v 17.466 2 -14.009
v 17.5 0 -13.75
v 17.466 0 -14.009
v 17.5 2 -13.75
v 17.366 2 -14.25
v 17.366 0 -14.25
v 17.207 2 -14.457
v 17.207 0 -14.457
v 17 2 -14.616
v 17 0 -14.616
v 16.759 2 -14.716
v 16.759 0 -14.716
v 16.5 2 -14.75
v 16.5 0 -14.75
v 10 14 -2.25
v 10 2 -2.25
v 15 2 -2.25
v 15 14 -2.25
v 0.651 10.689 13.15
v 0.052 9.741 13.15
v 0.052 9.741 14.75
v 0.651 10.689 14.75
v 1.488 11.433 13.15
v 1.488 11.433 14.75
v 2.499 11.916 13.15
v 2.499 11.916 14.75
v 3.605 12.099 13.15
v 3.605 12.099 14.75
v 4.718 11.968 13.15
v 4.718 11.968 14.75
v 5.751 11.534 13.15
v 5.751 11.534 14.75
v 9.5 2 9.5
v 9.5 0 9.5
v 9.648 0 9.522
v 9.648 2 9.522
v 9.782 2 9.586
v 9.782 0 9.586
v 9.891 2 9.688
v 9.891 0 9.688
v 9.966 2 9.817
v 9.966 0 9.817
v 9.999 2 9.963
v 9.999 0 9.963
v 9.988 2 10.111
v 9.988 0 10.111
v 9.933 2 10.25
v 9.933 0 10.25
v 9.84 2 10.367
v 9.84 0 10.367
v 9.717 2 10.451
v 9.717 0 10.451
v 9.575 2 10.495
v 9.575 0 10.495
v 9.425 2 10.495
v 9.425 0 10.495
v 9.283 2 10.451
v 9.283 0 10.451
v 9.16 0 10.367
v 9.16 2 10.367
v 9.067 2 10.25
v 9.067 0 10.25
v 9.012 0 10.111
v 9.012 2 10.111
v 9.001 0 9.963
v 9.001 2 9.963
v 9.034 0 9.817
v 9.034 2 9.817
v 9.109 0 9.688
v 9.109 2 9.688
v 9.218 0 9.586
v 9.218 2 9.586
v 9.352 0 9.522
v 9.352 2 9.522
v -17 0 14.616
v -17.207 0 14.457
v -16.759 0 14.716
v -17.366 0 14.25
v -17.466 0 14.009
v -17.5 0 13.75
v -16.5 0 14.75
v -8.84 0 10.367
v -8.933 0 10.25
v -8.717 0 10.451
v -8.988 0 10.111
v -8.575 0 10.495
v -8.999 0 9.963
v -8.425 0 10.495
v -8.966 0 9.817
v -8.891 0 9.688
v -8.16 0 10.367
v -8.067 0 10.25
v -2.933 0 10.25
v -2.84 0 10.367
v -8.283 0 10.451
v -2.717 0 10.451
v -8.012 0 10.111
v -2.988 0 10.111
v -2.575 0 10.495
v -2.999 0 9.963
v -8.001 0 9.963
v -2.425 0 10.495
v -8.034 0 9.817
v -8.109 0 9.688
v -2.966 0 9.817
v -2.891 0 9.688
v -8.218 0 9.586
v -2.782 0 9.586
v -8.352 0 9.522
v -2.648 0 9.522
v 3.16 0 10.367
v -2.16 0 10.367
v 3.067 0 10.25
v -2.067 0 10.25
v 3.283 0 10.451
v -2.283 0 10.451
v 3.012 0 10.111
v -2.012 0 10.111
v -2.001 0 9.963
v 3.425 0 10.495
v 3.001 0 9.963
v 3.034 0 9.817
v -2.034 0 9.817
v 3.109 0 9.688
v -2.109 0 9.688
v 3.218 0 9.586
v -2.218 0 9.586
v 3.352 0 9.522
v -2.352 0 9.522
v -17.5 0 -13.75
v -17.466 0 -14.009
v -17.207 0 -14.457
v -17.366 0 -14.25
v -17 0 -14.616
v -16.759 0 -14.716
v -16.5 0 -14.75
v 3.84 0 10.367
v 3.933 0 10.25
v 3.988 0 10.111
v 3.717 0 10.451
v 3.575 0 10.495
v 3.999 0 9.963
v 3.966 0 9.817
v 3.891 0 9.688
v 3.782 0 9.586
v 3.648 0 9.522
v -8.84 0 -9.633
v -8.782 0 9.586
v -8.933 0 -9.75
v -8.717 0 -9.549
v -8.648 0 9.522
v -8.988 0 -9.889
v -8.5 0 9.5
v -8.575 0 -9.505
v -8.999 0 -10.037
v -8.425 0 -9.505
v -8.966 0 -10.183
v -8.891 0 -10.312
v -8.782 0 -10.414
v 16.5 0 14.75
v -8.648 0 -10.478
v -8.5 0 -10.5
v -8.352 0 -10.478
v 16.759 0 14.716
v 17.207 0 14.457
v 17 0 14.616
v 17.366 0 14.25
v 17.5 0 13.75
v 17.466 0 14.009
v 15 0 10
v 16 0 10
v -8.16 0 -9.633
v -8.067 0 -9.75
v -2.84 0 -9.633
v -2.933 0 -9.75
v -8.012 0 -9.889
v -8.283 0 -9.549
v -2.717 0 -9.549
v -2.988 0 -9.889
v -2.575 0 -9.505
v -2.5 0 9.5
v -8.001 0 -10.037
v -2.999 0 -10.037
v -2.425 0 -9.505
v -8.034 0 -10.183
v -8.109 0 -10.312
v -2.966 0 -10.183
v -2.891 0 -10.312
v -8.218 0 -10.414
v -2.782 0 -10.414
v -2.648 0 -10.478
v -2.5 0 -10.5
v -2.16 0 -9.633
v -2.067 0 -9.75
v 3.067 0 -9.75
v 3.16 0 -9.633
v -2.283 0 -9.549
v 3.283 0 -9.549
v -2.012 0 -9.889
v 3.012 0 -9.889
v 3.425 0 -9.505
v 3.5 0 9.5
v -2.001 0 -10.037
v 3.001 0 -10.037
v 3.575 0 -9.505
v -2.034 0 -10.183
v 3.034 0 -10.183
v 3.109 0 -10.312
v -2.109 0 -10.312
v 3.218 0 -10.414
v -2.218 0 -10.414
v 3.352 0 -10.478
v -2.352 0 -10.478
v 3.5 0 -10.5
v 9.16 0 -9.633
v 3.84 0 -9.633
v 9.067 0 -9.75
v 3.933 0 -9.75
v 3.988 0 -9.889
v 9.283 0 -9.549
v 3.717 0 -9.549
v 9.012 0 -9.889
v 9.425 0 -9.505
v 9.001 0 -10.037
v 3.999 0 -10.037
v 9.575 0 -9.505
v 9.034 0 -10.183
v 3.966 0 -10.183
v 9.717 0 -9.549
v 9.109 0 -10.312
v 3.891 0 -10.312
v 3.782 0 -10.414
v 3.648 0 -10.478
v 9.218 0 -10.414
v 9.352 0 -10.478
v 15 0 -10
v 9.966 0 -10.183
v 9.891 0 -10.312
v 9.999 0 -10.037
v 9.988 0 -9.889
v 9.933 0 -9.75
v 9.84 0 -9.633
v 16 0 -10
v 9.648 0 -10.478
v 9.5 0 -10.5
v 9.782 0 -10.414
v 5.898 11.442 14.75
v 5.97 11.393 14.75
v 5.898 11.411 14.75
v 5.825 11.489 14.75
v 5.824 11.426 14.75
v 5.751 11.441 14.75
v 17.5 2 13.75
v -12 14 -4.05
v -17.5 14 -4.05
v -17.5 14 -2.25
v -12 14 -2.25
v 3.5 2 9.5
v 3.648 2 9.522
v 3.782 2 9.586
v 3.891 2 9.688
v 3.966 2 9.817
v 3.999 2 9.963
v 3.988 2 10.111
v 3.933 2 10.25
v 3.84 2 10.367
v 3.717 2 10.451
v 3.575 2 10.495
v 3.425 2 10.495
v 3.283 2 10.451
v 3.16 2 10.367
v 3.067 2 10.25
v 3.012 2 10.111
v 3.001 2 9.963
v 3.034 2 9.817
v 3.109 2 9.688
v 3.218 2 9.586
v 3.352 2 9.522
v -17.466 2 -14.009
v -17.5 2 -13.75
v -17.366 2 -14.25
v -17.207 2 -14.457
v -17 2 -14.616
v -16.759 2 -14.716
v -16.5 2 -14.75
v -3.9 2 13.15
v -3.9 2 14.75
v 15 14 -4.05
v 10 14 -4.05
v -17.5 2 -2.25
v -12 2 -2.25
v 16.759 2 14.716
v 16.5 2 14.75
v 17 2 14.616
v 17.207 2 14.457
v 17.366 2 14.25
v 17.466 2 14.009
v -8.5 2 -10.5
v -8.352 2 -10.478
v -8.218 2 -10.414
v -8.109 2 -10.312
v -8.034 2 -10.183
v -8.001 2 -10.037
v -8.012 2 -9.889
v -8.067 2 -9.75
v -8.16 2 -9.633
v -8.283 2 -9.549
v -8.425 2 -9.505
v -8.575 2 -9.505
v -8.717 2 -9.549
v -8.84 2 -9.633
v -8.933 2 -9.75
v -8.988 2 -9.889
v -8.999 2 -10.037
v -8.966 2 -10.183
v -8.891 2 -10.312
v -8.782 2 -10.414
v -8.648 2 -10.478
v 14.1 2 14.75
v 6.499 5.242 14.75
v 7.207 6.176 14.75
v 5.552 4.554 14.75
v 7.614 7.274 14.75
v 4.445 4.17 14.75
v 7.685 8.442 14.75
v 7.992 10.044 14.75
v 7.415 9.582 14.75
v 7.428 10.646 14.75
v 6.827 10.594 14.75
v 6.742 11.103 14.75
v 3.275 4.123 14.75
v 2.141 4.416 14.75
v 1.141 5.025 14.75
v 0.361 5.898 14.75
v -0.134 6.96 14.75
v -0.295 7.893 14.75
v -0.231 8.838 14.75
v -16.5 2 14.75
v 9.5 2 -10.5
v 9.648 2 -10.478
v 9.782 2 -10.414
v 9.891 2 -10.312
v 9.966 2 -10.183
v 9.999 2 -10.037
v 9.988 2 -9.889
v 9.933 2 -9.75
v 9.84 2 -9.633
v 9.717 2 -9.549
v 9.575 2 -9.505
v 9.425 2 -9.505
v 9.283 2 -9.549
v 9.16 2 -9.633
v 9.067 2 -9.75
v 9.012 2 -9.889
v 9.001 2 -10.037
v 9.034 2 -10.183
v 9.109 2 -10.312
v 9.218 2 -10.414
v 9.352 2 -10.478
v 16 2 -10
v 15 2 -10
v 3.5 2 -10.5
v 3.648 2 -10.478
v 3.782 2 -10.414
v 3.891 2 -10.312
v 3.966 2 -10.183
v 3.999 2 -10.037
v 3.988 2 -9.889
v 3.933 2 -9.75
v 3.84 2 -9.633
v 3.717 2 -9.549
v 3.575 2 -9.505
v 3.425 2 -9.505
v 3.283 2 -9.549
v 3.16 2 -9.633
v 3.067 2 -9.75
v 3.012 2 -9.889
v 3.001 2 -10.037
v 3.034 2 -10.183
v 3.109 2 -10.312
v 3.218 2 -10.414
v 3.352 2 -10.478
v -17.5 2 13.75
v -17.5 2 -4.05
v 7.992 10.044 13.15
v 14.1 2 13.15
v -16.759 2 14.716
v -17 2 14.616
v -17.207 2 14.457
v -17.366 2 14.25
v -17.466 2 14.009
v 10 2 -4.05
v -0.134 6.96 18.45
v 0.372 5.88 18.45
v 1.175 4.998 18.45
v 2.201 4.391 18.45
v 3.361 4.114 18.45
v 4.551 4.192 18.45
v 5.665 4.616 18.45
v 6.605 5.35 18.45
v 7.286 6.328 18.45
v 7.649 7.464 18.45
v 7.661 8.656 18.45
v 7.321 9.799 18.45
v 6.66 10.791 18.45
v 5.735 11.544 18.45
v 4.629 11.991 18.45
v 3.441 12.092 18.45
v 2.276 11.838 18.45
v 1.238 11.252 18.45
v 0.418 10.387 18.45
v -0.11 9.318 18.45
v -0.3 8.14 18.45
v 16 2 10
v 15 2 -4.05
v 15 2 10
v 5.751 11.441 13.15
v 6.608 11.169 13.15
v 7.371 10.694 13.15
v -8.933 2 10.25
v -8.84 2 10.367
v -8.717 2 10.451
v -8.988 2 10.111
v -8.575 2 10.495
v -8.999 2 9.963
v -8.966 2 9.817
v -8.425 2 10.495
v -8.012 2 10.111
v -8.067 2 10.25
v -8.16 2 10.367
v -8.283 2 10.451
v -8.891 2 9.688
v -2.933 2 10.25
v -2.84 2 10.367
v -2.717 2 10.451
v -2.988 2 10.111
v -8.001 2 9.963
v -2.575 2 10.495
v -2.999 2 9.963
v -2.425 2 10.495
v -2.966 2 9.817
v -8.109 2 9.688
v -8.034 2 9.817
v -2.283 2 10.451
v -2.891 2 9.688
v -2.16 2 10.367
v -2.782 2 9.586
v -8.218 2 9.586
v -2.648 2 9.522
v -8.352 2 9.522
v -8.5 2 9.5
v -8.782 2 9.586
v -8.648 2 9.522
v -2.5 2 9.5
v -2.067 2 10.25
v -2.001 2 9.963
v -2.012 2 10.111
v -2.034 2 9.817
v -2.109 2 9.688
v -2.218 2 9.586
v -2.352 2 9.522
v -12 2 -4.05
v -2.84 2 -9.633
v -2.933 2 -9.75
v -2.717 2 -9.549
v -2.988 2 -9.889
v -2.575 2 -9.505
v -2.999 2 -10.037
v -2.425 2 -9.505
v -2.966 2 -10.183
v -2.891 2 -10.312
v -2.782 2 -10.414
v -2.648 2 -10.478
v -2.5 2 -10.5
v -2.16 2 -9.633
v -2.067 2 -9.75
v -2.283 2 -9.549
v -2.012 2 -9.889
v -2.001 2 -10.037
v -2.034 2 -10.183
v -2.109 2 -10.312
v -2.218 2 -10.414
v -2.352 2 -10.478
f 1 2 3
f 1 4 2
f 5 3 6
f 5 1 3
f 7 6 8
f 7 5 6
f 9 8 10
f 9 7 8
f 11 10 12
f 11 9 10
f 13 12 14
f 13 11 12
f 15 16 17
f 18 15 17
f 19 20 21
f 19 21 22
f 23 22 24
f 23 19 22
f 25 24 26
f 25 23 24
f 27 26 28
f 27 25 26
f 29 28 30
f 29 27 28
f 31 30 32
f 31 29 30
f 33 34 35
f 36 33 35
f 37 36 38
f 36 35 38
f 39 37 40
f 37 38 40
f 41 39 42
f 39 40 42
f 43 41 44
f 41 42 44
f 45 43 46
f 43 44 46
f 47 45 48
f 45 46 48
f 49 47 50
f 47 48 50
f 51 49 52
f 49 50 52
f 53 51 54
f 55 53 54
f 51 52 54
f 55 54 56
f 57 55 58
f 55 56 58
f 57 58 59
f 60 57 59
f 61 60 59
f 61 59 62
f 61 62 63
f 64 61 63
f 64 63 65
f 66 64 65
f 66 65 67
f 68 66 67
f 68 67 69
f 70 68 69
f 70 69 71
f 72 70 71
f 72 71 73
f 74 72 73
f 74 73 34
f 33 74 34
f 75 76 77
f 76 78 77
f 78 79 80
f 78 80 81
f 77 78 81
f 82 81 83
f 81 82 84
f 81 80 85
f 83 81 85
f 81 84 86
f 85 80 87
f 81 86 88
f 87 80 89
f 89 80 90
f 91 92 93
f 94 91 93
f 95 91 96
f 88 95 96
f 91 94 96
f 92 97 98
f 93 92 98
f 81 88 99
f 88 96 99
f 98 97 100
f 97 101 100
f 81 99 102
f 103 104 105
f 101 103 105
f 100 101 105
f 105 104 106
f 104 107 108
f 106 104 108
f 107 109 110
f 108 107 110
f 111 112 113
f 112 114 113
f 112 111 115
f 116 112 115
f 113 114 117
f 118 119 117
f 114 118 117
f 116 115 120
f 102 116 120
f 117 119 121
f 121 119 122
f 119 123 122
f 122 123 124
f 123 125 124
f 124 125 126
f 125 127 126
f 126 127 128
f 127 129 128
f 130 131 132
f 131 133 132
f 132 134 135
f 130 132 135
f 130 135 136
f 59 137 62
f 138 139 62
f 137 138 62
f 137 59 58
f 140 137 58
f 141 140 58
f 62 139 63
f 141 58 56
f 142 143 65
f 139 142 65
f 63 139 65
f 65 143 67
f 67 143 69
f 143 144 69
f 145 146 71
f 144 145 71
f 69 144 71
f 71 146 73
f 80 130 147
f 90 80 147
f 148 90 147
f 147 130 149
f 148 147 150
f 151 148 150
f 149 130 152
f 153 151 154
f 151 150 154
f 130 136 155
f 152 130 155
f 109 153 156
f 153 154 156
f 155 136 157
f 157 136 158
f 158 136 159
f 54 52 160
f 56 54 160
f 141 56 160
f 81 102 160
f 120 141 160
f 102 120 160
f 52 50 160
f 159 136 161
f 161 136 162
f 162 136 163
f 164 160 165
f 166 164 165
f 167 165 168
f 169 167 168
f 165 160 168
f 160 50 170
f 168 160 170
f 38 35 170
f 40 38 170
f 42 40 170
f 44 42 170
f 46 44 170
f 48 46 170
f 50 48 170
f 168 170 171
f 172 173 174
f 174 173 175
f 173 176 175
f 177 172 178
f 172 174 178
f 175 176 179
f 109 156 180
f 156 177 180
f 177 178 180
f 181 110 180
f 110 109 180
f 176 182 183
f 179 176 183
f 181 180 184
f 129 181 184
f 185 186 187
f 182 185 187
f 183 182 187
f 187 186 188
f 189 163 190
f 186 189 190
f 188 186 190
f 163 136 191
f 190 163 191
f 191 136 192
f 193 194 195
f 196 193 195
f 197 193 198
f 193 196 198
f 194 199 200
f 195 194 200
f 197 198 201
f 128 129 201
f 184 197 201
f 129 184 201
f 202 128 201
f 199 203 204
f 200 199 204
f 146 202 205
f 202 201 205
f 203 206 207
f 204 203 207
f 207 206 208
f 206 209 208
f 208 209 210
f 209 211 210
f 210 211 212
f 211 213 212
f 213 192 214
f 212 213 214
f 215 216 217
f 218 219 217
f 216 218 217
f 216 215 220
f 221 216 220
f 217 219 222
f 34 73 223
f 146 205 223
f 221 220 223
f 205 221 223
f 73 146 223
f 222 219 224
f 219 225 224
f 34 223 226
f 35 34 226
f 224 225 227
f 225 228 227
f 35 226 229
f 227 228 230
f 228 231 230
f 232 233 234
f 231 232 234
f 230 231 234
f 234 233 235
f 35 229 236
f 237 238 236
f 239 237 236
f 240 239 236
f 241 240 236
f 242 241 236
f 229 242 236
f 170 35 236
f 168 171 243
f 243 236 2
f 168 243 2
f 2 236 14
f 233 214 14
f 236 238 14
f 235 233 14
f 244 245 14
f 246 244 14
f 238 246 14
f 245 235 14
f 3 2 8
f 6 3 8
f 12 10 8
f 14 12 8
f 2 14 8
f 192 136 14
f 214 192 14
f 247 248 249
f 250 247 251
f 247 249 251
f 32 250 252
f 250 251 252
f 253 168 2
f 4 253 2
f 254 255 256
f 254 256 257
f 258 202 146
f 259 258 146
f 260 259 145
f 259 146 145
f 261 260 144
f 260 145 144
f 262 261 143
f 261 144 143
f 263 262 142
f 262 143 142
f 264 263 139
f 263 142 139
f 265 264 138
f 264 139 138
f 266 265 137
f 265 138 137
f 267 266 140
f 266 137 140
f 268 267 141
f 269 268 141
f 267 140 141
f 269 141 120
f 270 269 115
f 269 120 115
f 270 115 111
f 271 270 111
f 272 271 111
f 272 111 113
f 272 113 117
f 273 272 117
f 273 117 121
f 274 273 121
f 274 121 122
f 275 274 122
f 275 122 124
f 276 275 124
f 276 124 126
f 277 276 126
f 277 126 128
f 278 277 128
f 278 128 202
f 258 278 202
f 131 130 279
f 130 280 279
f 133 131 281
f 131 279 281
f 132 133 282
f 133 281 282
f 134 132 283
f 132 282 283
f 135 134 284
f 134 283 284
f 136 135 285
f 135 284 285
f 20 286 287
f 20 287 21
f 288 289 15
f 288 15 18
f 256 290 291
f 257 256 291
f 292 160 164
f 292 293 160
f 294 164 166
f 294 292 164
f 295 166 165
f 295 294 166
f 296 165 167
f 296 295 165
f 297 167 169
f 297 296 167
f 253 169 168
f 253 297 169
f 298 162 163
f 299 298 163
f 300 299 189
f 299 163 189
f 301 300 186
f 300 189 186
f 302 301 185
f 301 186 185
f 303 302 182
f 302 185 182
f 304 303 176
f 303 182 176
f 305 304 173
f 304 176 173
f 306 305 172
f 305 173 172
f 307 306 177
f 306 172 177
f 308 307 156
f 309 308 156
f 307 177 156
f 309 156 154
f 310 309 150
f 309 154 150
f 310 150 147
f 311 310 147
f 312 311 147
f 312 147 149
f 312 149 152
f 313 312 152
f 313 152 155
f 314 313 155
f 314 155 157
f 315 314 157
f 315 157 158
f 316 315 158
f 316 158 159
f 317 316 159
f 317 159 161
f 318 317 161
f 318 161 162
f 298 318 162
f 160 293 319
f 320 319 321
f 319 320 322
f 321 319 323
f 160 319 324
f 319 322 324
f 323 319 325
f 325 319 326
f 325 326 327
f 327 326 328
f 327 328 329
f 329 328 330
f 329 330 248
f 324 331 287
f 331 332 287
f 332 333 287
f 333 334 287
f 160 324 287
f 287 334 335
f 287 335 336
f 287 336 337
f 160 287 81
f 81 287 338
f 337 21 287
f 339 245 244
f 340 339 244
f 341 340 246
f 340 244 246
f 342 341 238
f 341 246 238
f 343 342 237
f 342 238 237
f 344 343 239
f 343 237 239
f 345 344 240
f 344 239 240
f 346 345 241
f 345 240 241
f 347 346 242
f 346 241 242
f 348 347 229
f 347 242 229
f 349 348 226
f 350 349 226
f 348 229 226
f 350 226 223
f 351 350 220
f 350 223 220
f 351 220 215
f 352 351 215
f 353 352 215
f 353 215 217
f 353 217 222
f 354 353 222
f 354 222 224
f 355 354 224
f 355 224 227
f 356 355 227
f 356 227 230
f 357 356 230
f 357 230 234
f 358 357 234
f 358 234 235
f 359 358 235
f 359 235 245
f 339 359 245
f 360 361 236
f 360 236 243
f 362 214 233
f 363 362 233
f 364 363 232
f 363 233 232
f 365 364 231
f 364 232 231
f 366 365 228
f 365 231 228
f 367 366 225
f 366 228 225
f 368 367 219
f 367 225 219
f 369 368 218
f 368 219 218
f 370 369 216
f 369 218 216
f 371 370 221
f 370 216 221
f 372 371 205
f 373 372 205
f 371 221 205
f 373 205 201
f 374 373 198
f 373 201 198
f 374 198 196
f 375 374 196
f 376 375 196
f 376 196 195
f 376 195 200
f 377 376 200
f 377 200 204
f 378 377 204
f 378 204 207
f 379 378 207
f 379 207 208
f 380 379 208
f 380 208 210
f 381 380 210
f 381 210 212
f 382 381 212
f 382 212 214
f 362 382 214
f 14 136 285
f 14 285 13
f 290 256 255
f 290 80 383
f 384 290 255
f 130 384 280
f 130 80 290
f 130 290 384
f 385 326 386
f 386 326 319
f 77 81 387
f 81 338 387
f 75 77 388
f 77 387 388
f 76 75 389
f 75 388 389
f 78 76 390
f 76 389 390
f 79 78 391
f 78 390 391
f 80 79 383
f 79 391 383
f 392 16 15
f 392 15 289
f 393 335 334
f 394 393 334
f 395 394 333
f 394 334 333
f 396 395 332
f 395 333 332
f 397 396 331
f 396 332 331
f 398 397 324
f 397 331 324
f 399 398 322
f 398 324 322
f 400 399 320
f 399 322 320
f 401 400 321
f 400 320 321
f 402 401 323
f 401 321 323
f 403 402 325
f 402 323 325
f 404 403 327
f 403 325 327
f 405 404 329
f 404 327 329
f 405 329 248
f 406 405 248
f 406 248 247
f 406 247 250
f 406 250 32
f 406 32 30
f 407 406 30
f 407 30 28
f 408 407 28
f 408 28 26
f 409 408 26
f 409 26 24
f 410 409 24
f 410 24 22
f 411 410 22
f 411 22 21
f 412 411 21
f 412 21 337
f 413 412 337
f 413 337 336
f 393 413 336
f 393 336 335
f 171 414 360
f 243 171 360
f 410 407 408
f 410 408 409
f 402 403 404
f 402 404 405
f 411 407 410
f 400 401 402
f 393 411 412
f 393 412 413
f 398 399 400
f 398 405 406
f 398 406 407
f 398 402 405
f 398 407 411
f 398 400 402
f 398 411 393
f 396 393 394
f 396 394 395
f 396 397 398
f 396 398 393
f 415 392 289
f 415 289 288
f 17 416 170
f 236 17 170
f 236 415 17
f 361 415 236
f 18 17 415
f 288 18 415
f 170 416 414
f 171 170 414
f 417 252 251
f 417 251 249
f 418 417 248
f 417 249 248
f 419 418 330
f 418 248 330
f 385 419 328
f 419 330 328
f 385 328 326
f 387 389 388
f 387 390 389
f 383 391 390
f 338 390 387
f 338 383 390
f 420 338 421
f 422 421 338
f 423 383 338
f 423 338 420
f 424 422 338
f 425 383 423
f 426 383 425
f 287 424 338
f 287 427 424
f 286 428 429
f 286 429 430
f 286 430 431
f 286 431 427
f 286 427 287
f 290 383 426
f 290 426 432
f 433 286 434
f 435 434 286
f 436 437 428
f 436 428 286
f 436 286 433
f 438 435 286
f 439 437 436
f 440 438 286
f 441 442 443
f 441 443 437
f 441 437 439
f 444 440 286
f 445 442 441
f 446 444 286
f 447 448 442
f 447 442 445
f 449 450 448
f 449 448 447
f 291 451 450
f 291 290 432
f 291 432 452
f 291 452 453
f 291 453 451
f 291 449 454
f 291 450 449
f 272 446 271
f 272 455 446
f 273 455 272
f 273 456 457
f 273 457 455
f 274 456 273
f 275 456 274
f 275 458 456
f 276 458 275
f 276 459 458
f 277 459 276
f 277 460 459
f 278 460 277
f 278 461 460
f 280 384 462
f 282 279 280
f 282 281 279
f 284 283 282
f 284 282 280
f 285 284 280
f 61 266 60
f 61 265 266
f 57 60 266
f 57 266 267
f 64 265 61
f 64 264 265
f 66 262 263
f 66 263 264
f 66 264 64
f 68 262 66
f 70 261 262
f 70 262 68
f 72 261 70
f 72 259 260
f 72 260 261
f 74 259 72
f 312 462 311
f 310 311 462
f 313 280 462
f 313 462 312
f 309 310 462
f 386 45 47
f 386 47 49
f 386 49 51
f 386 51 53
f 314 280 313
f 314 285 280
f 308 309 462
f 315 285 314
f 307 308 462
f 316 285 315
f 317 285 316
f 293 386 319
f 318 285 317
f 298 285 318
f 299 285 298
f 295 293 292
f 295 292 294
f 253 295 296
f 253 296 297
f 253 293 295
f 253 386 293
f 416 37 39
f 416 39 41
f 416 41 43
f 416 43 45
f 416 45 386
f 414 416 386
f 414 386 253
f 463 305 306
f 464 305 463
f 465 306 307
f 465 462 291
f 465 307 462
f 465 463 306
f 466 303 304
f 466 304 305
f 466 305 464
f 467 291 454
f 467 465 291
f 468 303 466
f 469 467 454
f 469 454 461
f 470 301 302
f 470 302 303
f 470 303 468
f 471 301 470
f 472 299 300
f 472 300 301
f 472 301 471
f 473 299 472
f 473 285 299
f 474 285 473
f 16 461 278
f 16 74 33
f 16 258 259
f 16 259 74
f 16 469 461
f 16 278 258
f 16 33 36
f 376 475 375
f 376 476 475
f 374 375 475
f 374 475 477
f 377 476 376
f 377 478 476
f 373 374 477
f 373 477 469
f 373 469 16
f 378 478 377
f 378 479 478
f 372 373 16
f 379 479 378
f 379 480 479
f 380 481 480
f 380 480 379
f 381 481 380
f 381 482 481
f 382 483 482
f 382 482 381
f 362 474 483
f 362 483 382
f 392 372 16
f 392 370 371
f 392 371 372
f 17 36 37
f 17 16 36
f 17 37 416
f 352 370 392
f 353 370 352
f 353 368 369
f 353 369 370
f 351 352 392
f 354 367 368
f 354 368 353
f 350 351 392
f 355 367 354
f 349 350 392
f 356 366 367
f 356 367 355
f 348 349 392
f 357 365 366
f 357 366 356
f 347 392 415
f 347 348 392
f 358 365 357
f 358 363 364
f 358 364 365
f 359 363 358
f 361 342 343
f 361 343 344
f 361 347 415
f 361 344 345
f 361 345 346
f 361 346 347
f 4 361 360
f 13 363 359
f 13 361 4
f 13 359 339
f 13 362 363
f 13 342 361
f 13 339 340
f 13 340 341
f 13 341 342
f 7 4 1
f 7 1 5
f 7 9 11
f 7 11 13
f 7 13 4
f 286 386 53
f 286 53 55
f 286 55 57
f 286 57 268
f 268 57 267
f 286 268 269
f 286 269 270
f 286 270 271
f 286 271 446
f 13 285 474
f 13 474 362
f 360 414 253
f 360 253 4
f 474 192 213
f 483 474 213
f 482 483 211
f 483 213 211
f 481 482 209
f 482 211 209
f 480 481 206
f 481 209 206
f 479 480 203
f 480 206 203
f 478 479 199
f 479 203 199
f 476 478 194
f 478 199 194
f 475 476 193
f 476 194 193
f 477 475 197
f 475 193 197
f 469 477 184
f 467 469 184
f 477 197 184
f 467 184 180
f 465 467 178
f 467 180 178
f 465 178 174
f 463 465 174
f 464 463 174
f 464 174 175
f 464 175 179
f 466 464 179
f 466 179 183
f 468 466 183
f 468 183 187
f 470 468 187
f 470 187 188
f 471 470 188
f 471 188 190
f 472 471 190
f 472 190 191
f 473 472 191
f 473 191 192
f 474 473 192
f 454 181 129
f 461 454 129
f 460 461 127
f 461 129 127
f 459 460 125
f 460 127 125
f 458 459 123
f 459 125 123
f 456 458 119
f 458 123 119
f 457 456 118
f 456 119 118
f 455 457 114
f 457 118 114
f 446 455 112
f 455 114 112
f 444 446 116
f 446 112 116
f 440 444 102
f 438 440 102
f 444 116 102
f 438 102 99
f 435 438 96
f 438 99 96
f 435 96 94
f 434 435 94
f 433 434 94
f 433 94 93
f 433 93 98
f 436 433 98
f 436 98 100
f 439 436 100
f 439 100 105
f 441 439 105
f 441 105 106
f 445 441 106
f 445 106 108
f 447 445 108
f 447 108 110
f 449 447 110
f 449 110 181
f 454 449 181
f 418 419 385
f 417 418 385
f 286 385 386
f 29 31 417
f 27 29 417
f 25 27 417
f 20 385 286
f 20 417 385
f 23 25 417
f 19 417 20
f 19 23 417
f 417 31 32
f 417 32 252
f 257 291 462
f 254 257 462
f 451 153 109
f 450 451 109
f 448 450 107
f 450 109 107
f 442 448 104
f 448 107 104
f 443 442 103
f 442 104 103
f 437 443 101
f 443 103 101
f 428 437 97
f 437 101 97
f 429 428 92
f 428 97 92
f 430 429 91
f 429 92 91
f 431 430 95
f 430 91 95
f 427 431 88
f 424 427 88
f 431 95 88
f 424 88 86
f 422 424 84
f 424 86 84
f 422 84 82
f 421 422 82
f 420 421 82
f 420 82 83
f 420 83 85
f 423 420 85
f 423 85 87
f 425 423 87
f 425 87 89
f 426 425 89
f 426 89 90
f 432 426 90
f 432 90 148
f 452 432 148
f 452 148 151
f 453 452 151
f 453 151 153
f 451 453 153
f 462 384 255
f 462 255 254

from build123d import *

# Parameters (mm, degrees)
CROQUIS1_W              = 35
CROQUIS1_H              = 29.5
SALIENTE_EXTRUIR1_DEPTH = 2
SALIENTE_EXTRUIR2_DEPTH = 1.6
CROQUIS3_R              = 4
SALIENTE_EXTRUIR3_DEPTH = 3.7
CROQUIS4_W              = 5.5
CROQUIS4_H              = 1.8
CROQUIS4_W_2            = 5
SALIENTE_EXTRUIR4_DEPTH = 12
CROQUIS5_W              = 1
CROQUIS5_H              = 20
CORTAR_EXTRUIR1_DEPTH   = 29.118543703
CROQUIS6_R              = 0.500490027
CORTAR_EXTRUIR2_DEPTH   = 12
REDONDEO1_R             = 1
SALIENTE_EXTRUIR5_START = 1.6
SALIENTE_EXTRUIR5_DEPTH = 1.6


with BuildPart() as part:
    # Croquis1 → Saliente-Extruir1 (new body)
    with BuildSketch(Plane(origin=(0, 0, 0), x_dir=(1, 0, 0), z_dir=(0, 1, 0))):
        Rectangle(CROQUIS1_W, CROQUIS1_H)
    extrude(amount=SALIENTE_EXTRUIR1_DEPTH)

    # Croquis2 → Saliente-Extruir2 (add)
    with BuildSketch(Plane.XY.offset(14.75)):
        with BuildLine():
            Line((14.1, 2), (-3.9, 2))
            Line((-3.9, 2), (2.207935866, 10.043820198))
            ThreePointArc((2.207935866, 10.043820198), (5.1, 11.5), (7.992064134, 10.043820198))
            Line((7.992064134, 10.043820198), (14.1, 2))
        make_face()
    extrude(amount=-SALIENTE_EXTRUIR2_DEPTH)

    # Croquis3 → Saliente-Extruir3 (add)
    with BuildSketch(Plane.XY.offset(14.75)):
        with Locations(Location((3.7, 8.1, 0), (0, 0, 196.564510331))):
            Circle(CROQUIS3_R)
    extrude(amount=SALIENTE_EXTRUIR3_DEPTH)

    # Croquis4 → Saliente-Extruir4 (add)
    with BuildSketch(Plane(origin=(0, 2, 0), x_dir=(1, 0, 0), z_dir=(0, 1, 0))):
        with Locations((-14.75, 3.15)):
            Rectangle(CROQUIS4_W, CROQUIS4_H)
        with Locations((12.5, 3.15)):
            Rectangle(CROQUIS4_W_2, CROQUIS4_H)
    extrude(amount=SALIENTE_EXTRUIR4_DEPTH)

    # Croquis5 → Cortar-Extruir1 (cut, through all)
    with BuildSketch(Plane(origin=(0, 2, 0), x_dir=(1, 0, 0), z_dir=(0, 1, 0))):
        with Locations((15.5, 0)):
            Rectangle(CROQUIS5_W, CROQUIS5_H)
    extrude(amount=-CORTAR_EXTRUIR1_DEPTH, mode=Mode.SUBTRACT)

    # Croquis6 → Cortar-Extruir2 (cut)
    with BuildSketch(Plane.XZ):
        with Locations(Location((-8.5, -10, 0), (0, 0, 270))):
            Circle(CROQUIS6_R)
        with Locations(Location((-2.5, -10, 0), (0, 0, 270))):
            Circle(CROQUIS6_R)
        with Locations(Location((3.5, -10, 0), (0, 0, 270))):
            Circle(CROQUIS6_R)
        with Locations(Location((9.5, -10, 0), (0, 0, 270))):
            Circle(CROQUIS6_R)
        with Locations(Location((-2.5, 10, 0), (0, 0, 270))):
            Circle(CROQUIS6_R)
        with Locations(Location((3.5, 10, 0), (0, 0, 270))):
            Circle(CROQUIS6_R)
        with Locations(Location((9.5, 10, 0), (0, 0, 270))):
            Circle(CROQUIS6_R)
        with Locations(Location((-8.5, 10, 0), (0, 0, 270))):
            Circle(CROQUIS6_R)
    extrude(amount=-CORTAR_EXTRUIR2_DEPTH, mode=Mode.SUBTRACT)

    # Redondeo1
    redondeo1_edges = [part.edges().sort_by_distance(p)[0] for p in [
        (17.5, 1, 14.75),
        (-17.5, 1, 14.75),
        (-17.5, 1, -14.75),
        (17.5, 1, -14.75),
    ]]
    fillet(redondeo1_edges, radius=REDONDEO1_R)

    # Croquis7 → Saliente-Extruir5 (add)
    with BuildSketch(Plane(origin=(0, 0, 14.75), x_dir=(-1, 0, 0), z_dir=(0, 0, -1)).offset(SALIENTE_EXTRUIR5_START)):
        with BuildLine():
            Line((3.9, 2), (-0.052229294, 9.741270508))
            ThreePointArc((-0.052229294, 9.741270508), (-2.499470939, 11.915590383), (-5.750816337, 11.534261544))
            Line((-5.750816337, 11.534261544), (-5.750816337, 2))
            Line((-5.750816337, 2), (3.9, 2))
        make_face()
    extrude(amount=-SALIENTE_EXTRUIR5_DEPTH)


solid = part.part
